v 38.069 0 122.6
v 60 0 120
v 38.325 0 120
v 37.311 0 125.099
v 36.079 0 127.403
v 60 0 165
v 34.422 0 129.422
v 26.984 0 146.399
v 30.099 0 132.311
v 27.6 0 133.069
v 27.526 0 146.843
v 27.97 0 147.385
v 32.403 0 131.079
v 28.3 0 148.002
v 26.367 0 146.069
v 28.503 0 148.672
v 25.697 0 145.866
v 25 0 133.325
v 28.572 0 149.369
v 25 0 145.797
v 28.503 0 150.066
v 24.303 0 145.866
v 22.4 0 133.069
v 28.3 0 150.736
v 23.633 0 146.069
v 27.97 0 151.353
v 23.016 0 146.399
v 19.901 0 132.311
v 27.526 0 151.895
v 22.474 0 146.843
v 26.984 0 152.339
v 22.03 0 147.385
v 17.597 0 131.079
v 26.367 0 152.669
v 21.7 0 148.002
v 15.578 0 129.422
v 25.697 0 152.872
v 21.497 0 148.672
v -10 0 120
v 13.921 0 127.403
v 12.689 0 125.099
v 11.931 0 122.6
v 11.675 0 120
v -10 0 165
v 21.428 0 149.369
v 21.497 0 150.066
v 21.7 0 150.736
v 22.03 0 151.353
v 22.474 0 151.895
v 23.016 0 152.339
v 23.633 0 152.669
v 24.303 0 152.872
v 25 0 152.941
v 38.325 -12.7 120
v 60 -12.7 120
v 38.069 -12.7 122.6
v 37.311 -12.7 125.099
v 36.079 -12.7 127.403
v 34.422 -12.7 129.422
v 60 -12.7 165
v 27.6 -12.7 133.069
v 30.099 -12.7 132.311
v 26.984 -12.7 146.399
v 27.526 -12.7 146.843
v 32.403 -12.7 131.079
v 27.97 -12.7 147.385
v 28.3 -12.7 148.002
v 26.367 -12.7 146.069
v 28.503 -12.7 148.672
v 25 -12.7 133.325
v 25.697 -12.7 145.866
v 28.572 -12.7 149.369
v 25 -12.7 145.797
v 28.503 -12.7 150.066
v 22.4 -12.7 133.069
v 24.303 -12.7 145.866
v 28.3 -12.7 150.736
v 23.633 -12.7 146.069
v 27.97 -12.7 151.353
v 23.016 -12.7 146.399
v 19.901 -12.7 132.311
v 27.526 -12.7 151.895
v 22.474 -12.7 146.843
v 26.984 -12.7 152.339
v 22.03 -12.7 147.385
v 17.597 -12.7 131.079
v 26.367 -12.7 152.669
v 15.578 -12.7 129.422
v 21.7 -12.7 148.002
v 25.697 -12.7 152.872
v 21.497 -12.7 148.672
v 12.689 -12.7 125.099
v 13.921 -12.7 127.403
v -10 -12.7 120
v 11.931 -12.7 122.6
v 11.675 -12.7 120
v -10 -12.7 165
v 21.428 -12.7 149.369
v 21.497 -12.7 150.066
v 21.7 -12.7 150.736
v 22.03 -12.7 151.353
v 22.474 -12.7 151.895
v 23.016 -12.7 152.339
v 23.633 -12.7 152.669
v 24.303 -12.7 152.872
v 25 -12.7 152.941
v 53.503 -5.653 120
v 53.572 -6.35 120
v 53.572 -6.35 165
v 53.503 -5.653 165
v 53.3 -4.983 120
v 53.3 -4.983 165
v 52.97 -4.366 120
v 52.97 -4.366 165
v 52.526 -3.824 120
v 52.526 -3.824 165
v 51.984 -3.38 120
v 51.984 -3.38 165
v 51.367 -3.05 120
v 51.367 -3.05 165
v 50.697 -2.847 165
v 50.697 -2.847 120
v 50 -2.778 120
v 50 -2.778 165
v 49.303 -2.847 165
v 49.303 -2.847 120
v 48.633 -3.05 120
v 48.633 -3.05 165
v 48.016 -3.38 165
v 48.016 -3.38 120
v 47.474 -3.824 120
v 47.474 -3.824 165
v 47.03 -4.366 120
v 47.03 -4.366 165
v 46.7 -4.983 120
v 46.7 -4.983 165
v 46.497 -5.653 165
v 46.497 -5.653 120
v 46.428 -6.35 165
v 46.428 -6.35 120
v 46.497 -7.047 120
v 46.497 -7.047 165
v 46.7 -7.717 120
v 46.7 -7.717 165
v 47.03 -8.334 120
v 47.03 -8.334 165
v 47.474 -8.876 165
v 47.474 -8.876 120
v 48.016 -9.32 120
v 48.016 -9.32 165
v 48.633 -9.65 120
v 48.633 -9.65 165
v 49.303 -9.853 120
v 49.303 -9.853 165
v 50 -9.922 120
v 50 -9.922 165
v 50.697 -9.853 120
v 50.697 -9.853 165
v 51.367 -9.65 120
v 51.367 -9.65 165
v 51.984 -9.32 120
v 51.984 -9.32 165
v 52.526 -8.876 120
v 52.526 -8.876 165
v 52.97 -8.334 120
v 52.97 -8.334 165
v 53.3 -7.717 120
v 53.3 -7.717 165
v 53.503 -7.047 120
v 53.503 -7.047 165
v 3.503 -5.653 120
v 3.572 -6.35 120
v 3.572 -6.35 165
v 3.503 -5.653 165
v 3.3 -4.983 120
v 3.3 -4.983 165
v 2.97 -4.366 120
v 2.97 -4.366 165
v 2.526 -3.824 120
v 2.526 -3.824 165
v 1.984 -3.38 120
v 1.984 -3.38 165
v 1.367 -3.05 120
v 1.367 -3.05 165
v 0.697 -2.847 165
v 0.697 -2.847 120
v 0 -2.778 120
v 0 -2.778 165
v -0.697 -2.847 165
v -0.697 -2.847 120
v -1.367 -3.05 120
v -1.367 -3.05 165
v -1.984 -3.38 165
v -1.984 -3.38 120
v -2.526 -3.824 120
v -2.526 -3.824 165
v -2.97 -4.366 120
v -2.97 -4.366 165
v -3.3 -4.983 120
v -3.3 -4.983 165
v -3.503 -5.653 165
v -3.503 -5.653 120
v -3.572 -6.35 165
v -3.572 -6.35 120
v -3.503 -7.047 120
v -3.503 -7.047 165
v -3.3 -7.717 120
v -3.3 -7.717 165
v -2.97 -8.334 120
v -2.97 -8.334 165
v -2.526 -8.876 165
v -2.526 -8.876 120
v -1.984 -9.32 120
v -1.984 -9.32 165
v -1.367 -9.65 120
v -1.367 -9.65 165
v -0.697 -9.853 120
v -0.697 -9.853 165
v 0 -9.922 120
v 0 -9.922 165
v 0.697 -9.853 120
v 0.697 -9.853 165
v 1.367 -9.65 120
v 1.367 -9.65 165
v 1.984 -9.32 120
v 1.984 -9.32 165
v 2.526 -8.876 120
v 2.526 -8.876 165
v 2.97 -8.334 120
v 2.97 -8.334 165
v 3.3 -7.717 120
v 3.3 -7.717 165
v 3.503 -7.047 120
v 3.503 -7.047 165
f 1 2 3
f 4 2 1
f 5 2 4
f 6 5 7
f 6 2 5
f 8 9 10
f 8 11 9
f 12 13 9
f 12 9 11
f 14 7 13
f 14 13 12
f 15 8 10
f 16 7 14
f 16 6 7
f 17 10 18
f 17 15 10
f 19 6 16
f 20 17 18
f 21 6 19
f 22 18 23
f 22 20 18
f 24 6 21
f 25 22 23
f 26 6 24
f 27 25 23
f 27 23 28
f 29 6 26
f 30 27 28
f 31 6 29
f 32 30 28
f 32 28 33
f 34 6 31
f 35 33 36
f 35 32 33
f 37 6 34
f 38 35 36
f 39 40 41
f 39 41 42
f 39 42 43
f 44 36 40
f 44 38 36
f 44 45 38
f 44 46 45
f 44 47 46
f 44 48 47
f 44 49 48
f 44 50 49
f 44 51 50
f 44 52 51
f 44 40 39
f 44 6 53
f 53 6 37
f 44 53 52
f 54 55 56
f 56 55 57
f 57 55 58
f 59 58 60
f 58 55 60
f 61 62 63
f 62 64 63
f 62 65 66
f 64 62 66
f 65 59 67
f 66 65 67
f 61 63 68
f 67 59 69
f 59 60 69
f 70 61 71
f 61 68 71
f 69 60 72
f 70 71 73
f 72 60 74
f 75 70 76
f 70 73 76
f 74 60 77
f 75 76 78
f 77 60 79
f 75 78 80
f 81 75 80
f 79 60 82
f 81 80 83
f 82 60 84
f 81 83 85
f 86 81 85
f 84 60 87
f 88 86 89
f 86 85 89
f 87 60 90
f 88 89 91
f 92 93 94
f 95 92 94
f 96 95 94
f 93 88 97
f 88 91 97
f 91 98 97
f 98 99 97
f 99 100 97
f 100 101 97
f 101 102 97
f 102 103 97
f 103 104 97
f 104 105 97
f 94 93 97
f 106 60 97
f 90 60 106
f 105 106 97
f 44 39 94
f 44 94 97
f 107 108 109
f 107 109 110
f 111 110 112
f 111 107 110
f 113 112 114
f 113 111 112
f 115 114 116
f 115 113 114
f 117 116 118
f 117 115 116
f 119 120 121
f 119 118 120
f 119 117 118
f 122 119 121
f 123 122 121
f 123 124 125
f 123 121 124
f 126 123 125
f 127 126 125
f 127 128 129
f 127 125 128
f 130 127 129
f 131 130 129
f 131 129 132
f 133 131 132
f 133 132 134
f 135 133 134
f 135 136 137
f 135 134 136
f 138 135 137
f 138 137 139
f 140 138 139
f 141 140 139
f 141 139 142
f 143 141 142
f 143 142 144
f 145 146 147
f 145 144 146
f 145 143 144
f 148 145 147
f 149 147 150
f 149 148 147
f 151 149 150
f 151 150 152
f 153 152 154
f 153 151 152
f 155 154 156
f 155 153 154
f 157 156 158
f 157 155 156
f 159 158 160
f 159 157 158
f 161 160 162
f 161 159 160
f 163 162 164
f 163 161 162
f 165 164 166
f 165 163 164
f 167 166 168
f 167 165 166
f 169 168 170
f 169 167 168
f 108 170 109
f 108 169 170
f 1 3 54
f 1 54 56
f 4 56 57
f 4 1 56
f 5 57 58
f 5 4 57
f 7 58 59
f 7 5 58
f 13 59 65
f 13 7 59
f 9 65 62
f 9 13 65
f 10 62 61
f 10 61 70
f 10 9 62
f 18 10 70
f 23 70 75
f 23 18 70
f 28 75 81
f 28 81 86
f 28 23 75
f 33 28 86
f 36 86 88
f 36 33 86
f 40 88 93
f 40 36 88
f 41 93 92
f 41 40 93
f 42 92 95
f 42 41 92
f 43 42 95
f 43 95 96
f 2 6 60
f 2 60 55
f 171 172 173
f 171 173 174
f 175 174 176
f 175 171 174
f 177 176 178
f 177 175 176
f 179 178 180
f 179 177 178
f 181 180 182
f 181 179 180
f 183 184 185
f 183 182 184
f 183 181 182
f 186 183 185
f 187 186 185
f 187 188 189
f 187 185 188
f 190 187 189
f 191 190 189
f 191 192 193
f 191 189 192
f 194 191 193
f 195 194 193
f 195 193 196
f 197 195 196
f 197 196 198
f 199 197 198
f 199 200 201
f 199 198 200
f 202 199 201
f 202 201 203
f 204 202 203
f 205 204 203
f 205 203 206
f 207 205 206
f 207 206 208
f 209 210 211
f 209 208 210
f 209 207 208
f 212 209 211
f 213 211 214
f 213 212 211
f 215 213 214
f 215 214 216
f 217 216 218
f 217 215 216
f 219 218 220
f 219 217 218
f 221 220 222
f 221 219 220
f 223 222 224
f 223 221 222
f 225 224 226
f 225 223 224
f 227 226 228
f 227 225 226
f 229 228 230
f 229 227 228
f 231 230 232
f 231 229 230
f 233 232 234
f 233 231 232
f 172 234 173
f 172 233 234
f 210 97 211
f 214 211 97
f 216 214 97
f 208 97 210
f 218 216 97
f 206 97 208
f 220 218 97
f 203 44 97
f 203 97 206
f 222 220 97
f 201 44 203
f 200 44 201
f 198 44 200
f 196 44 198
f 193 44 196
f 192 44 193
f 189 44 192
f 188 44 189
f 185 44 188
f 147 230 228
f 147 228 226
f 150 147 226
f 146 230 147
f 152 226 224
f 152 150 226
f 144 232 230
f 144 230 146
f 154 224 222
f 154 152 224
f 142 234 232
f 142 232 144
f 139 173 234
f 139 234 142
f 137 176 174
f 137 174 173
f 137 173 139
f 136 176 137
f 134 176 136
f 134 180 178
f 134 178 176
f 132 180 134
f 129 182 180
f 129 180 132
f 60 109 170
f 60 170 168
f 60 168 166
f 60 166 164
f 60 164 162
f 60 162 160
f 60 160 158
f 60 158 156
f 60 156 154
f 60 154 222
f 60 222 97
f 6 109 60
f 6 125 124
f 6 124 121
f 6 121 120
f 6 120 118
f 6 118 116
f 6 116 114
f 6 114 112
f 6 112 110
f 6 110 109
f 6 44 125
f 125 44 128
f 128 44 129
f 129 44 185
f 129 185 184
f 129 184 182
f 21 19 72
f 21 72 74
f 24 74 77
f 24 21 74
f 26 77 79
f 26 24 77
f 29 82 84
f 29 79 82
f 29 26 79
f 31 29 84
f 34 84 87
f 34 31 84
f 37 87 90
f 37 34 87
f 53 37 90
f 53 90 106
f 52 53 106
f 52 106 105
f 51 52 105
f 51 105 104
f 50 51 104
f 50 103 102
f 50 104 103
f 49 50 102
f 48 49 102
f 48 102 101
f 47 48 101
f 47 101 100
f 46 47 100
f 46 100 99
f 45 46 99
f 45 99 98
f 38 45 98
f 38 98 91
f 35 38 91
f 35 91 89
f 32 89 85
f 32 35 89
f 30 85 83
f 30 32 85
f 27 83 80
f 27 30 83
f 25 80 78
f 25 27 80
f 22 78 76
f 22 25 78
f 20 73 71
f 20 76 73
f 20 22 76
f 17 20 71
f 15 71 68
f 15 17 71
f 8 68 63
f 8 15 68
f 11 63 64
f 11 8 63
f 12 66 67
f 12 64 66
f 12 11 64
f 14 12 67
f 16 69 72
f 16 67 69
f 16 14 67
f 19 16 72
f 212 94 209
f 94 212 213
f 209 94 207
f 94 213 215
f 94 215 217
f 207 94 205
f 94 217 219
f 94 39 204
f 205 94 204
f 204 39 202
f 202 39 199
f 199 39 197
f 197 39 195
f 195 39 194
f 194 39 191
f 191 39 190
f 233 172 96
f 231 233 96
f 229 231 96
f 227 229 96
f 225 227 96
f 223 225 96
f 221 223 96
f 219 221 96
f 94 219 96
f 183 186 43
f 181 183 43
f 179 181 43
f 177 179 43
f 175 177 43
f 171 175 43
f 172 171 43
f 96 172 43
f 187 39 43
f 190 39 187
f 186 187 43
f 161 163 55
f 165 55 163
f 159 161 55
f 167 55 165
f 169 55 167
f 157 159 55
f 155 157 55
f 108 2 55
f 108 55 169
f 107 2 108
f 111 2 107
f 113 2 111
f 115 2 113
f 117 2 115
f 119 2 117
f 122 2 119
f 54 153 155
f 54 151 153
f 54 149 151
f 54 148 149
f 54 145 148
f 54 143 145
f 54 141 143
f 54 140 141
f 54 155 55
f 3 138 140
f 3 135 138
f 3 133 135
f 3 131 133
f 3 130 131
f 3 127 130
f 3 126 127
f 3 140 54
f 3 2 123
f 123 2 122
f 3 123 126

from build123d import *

# Parameters (mm, degrees)
SKETCH022_R  = 3.571875
PAD022_DEPTH = 55
SKETCH021_R  = 3.571875
PAD021_DEPTH = 55
SKETCH020_R  = 3.571875
PAD020_DEPTH = 30
PAD002_DEPTH = 12.7


with BuildPart() as body022:
    # Sketch022 → Pad022 (new body)
    with BuildSketch(Plane.XY):
        Circle(SKETCH022_R)
    extrude(amount=PAD022_DEPTH)


with BuildPart() as body022_1:
    # Body022 placement: moved
    add(body022.part.moved(Location((150, -6.35, 115))))


with BuildPart() as body021:
    # Sketch021 → Pad021 (new body)
    with BuildSketch(Plane.XY):
        Circle(SKETCH021_R)
    extrude(amount=PAD021_DEPTH)


with BuildPart() as body021_1:
    # Body021 placement: moved
    add(body021.part.moved(Location((100, -6.35, 115))))


with BuildPart() as body020:
    # Sketch020 → Pad020 (new body)
    with BuildSketch(Plane.XZ):
        Circle(SKETCH020_R)
    extrude(amount=PAD020_DEPTH)


with BuildPart() as body020_1:
    # Body020 placement: moved
    add(body020.part.moved(Location((25, 2, 149.369))))


with BuildPart() as braceupper:
    # Sketch002 → Pad002 (new body)
    with BuildSketch(Plane.XZ):
        with BuildLine():
            Line((-20, 110), (-20, 155))
            Line((-20, 155), (50, 155))
            Line((50, 155), (50, 110))
            Line((50, 110), (28.325, 110))
            ThreePointArc((28.325, 110), (15, 123.324967), (1.675, 110))
            Line((-20, 110), (1.675, 110))
        make_face()
    extrude(amount=PAD002_DEPTH)


with BuildPart() as braceupper_1:
    # Body002 placement: moved
    add(braceupper.part.moved(Location((10, 0, 10))))

    # Cut013: cut Body020
    add(body020_1.part, mode=Mode.SUBTRACT)


with BuildPart() as braceupper_2:
    # Cut013 placement: moved
    add(braceupper_1.part.moved(Location((100, 0, 0))))

    # Cut014: cut Body021
    add(body021_1.part, mode=Mode.SUBTRACT)

    # Cut015: cut Body022
    add(body022_1.part, mode=Mode.SUBTRACT)


with BuildPart() as braceupper_3:
    # Cut015 placement: moved
    add(braceupper_2.part.moved(Location((-100, 0, 0))))


solid = braceupper_3.part
